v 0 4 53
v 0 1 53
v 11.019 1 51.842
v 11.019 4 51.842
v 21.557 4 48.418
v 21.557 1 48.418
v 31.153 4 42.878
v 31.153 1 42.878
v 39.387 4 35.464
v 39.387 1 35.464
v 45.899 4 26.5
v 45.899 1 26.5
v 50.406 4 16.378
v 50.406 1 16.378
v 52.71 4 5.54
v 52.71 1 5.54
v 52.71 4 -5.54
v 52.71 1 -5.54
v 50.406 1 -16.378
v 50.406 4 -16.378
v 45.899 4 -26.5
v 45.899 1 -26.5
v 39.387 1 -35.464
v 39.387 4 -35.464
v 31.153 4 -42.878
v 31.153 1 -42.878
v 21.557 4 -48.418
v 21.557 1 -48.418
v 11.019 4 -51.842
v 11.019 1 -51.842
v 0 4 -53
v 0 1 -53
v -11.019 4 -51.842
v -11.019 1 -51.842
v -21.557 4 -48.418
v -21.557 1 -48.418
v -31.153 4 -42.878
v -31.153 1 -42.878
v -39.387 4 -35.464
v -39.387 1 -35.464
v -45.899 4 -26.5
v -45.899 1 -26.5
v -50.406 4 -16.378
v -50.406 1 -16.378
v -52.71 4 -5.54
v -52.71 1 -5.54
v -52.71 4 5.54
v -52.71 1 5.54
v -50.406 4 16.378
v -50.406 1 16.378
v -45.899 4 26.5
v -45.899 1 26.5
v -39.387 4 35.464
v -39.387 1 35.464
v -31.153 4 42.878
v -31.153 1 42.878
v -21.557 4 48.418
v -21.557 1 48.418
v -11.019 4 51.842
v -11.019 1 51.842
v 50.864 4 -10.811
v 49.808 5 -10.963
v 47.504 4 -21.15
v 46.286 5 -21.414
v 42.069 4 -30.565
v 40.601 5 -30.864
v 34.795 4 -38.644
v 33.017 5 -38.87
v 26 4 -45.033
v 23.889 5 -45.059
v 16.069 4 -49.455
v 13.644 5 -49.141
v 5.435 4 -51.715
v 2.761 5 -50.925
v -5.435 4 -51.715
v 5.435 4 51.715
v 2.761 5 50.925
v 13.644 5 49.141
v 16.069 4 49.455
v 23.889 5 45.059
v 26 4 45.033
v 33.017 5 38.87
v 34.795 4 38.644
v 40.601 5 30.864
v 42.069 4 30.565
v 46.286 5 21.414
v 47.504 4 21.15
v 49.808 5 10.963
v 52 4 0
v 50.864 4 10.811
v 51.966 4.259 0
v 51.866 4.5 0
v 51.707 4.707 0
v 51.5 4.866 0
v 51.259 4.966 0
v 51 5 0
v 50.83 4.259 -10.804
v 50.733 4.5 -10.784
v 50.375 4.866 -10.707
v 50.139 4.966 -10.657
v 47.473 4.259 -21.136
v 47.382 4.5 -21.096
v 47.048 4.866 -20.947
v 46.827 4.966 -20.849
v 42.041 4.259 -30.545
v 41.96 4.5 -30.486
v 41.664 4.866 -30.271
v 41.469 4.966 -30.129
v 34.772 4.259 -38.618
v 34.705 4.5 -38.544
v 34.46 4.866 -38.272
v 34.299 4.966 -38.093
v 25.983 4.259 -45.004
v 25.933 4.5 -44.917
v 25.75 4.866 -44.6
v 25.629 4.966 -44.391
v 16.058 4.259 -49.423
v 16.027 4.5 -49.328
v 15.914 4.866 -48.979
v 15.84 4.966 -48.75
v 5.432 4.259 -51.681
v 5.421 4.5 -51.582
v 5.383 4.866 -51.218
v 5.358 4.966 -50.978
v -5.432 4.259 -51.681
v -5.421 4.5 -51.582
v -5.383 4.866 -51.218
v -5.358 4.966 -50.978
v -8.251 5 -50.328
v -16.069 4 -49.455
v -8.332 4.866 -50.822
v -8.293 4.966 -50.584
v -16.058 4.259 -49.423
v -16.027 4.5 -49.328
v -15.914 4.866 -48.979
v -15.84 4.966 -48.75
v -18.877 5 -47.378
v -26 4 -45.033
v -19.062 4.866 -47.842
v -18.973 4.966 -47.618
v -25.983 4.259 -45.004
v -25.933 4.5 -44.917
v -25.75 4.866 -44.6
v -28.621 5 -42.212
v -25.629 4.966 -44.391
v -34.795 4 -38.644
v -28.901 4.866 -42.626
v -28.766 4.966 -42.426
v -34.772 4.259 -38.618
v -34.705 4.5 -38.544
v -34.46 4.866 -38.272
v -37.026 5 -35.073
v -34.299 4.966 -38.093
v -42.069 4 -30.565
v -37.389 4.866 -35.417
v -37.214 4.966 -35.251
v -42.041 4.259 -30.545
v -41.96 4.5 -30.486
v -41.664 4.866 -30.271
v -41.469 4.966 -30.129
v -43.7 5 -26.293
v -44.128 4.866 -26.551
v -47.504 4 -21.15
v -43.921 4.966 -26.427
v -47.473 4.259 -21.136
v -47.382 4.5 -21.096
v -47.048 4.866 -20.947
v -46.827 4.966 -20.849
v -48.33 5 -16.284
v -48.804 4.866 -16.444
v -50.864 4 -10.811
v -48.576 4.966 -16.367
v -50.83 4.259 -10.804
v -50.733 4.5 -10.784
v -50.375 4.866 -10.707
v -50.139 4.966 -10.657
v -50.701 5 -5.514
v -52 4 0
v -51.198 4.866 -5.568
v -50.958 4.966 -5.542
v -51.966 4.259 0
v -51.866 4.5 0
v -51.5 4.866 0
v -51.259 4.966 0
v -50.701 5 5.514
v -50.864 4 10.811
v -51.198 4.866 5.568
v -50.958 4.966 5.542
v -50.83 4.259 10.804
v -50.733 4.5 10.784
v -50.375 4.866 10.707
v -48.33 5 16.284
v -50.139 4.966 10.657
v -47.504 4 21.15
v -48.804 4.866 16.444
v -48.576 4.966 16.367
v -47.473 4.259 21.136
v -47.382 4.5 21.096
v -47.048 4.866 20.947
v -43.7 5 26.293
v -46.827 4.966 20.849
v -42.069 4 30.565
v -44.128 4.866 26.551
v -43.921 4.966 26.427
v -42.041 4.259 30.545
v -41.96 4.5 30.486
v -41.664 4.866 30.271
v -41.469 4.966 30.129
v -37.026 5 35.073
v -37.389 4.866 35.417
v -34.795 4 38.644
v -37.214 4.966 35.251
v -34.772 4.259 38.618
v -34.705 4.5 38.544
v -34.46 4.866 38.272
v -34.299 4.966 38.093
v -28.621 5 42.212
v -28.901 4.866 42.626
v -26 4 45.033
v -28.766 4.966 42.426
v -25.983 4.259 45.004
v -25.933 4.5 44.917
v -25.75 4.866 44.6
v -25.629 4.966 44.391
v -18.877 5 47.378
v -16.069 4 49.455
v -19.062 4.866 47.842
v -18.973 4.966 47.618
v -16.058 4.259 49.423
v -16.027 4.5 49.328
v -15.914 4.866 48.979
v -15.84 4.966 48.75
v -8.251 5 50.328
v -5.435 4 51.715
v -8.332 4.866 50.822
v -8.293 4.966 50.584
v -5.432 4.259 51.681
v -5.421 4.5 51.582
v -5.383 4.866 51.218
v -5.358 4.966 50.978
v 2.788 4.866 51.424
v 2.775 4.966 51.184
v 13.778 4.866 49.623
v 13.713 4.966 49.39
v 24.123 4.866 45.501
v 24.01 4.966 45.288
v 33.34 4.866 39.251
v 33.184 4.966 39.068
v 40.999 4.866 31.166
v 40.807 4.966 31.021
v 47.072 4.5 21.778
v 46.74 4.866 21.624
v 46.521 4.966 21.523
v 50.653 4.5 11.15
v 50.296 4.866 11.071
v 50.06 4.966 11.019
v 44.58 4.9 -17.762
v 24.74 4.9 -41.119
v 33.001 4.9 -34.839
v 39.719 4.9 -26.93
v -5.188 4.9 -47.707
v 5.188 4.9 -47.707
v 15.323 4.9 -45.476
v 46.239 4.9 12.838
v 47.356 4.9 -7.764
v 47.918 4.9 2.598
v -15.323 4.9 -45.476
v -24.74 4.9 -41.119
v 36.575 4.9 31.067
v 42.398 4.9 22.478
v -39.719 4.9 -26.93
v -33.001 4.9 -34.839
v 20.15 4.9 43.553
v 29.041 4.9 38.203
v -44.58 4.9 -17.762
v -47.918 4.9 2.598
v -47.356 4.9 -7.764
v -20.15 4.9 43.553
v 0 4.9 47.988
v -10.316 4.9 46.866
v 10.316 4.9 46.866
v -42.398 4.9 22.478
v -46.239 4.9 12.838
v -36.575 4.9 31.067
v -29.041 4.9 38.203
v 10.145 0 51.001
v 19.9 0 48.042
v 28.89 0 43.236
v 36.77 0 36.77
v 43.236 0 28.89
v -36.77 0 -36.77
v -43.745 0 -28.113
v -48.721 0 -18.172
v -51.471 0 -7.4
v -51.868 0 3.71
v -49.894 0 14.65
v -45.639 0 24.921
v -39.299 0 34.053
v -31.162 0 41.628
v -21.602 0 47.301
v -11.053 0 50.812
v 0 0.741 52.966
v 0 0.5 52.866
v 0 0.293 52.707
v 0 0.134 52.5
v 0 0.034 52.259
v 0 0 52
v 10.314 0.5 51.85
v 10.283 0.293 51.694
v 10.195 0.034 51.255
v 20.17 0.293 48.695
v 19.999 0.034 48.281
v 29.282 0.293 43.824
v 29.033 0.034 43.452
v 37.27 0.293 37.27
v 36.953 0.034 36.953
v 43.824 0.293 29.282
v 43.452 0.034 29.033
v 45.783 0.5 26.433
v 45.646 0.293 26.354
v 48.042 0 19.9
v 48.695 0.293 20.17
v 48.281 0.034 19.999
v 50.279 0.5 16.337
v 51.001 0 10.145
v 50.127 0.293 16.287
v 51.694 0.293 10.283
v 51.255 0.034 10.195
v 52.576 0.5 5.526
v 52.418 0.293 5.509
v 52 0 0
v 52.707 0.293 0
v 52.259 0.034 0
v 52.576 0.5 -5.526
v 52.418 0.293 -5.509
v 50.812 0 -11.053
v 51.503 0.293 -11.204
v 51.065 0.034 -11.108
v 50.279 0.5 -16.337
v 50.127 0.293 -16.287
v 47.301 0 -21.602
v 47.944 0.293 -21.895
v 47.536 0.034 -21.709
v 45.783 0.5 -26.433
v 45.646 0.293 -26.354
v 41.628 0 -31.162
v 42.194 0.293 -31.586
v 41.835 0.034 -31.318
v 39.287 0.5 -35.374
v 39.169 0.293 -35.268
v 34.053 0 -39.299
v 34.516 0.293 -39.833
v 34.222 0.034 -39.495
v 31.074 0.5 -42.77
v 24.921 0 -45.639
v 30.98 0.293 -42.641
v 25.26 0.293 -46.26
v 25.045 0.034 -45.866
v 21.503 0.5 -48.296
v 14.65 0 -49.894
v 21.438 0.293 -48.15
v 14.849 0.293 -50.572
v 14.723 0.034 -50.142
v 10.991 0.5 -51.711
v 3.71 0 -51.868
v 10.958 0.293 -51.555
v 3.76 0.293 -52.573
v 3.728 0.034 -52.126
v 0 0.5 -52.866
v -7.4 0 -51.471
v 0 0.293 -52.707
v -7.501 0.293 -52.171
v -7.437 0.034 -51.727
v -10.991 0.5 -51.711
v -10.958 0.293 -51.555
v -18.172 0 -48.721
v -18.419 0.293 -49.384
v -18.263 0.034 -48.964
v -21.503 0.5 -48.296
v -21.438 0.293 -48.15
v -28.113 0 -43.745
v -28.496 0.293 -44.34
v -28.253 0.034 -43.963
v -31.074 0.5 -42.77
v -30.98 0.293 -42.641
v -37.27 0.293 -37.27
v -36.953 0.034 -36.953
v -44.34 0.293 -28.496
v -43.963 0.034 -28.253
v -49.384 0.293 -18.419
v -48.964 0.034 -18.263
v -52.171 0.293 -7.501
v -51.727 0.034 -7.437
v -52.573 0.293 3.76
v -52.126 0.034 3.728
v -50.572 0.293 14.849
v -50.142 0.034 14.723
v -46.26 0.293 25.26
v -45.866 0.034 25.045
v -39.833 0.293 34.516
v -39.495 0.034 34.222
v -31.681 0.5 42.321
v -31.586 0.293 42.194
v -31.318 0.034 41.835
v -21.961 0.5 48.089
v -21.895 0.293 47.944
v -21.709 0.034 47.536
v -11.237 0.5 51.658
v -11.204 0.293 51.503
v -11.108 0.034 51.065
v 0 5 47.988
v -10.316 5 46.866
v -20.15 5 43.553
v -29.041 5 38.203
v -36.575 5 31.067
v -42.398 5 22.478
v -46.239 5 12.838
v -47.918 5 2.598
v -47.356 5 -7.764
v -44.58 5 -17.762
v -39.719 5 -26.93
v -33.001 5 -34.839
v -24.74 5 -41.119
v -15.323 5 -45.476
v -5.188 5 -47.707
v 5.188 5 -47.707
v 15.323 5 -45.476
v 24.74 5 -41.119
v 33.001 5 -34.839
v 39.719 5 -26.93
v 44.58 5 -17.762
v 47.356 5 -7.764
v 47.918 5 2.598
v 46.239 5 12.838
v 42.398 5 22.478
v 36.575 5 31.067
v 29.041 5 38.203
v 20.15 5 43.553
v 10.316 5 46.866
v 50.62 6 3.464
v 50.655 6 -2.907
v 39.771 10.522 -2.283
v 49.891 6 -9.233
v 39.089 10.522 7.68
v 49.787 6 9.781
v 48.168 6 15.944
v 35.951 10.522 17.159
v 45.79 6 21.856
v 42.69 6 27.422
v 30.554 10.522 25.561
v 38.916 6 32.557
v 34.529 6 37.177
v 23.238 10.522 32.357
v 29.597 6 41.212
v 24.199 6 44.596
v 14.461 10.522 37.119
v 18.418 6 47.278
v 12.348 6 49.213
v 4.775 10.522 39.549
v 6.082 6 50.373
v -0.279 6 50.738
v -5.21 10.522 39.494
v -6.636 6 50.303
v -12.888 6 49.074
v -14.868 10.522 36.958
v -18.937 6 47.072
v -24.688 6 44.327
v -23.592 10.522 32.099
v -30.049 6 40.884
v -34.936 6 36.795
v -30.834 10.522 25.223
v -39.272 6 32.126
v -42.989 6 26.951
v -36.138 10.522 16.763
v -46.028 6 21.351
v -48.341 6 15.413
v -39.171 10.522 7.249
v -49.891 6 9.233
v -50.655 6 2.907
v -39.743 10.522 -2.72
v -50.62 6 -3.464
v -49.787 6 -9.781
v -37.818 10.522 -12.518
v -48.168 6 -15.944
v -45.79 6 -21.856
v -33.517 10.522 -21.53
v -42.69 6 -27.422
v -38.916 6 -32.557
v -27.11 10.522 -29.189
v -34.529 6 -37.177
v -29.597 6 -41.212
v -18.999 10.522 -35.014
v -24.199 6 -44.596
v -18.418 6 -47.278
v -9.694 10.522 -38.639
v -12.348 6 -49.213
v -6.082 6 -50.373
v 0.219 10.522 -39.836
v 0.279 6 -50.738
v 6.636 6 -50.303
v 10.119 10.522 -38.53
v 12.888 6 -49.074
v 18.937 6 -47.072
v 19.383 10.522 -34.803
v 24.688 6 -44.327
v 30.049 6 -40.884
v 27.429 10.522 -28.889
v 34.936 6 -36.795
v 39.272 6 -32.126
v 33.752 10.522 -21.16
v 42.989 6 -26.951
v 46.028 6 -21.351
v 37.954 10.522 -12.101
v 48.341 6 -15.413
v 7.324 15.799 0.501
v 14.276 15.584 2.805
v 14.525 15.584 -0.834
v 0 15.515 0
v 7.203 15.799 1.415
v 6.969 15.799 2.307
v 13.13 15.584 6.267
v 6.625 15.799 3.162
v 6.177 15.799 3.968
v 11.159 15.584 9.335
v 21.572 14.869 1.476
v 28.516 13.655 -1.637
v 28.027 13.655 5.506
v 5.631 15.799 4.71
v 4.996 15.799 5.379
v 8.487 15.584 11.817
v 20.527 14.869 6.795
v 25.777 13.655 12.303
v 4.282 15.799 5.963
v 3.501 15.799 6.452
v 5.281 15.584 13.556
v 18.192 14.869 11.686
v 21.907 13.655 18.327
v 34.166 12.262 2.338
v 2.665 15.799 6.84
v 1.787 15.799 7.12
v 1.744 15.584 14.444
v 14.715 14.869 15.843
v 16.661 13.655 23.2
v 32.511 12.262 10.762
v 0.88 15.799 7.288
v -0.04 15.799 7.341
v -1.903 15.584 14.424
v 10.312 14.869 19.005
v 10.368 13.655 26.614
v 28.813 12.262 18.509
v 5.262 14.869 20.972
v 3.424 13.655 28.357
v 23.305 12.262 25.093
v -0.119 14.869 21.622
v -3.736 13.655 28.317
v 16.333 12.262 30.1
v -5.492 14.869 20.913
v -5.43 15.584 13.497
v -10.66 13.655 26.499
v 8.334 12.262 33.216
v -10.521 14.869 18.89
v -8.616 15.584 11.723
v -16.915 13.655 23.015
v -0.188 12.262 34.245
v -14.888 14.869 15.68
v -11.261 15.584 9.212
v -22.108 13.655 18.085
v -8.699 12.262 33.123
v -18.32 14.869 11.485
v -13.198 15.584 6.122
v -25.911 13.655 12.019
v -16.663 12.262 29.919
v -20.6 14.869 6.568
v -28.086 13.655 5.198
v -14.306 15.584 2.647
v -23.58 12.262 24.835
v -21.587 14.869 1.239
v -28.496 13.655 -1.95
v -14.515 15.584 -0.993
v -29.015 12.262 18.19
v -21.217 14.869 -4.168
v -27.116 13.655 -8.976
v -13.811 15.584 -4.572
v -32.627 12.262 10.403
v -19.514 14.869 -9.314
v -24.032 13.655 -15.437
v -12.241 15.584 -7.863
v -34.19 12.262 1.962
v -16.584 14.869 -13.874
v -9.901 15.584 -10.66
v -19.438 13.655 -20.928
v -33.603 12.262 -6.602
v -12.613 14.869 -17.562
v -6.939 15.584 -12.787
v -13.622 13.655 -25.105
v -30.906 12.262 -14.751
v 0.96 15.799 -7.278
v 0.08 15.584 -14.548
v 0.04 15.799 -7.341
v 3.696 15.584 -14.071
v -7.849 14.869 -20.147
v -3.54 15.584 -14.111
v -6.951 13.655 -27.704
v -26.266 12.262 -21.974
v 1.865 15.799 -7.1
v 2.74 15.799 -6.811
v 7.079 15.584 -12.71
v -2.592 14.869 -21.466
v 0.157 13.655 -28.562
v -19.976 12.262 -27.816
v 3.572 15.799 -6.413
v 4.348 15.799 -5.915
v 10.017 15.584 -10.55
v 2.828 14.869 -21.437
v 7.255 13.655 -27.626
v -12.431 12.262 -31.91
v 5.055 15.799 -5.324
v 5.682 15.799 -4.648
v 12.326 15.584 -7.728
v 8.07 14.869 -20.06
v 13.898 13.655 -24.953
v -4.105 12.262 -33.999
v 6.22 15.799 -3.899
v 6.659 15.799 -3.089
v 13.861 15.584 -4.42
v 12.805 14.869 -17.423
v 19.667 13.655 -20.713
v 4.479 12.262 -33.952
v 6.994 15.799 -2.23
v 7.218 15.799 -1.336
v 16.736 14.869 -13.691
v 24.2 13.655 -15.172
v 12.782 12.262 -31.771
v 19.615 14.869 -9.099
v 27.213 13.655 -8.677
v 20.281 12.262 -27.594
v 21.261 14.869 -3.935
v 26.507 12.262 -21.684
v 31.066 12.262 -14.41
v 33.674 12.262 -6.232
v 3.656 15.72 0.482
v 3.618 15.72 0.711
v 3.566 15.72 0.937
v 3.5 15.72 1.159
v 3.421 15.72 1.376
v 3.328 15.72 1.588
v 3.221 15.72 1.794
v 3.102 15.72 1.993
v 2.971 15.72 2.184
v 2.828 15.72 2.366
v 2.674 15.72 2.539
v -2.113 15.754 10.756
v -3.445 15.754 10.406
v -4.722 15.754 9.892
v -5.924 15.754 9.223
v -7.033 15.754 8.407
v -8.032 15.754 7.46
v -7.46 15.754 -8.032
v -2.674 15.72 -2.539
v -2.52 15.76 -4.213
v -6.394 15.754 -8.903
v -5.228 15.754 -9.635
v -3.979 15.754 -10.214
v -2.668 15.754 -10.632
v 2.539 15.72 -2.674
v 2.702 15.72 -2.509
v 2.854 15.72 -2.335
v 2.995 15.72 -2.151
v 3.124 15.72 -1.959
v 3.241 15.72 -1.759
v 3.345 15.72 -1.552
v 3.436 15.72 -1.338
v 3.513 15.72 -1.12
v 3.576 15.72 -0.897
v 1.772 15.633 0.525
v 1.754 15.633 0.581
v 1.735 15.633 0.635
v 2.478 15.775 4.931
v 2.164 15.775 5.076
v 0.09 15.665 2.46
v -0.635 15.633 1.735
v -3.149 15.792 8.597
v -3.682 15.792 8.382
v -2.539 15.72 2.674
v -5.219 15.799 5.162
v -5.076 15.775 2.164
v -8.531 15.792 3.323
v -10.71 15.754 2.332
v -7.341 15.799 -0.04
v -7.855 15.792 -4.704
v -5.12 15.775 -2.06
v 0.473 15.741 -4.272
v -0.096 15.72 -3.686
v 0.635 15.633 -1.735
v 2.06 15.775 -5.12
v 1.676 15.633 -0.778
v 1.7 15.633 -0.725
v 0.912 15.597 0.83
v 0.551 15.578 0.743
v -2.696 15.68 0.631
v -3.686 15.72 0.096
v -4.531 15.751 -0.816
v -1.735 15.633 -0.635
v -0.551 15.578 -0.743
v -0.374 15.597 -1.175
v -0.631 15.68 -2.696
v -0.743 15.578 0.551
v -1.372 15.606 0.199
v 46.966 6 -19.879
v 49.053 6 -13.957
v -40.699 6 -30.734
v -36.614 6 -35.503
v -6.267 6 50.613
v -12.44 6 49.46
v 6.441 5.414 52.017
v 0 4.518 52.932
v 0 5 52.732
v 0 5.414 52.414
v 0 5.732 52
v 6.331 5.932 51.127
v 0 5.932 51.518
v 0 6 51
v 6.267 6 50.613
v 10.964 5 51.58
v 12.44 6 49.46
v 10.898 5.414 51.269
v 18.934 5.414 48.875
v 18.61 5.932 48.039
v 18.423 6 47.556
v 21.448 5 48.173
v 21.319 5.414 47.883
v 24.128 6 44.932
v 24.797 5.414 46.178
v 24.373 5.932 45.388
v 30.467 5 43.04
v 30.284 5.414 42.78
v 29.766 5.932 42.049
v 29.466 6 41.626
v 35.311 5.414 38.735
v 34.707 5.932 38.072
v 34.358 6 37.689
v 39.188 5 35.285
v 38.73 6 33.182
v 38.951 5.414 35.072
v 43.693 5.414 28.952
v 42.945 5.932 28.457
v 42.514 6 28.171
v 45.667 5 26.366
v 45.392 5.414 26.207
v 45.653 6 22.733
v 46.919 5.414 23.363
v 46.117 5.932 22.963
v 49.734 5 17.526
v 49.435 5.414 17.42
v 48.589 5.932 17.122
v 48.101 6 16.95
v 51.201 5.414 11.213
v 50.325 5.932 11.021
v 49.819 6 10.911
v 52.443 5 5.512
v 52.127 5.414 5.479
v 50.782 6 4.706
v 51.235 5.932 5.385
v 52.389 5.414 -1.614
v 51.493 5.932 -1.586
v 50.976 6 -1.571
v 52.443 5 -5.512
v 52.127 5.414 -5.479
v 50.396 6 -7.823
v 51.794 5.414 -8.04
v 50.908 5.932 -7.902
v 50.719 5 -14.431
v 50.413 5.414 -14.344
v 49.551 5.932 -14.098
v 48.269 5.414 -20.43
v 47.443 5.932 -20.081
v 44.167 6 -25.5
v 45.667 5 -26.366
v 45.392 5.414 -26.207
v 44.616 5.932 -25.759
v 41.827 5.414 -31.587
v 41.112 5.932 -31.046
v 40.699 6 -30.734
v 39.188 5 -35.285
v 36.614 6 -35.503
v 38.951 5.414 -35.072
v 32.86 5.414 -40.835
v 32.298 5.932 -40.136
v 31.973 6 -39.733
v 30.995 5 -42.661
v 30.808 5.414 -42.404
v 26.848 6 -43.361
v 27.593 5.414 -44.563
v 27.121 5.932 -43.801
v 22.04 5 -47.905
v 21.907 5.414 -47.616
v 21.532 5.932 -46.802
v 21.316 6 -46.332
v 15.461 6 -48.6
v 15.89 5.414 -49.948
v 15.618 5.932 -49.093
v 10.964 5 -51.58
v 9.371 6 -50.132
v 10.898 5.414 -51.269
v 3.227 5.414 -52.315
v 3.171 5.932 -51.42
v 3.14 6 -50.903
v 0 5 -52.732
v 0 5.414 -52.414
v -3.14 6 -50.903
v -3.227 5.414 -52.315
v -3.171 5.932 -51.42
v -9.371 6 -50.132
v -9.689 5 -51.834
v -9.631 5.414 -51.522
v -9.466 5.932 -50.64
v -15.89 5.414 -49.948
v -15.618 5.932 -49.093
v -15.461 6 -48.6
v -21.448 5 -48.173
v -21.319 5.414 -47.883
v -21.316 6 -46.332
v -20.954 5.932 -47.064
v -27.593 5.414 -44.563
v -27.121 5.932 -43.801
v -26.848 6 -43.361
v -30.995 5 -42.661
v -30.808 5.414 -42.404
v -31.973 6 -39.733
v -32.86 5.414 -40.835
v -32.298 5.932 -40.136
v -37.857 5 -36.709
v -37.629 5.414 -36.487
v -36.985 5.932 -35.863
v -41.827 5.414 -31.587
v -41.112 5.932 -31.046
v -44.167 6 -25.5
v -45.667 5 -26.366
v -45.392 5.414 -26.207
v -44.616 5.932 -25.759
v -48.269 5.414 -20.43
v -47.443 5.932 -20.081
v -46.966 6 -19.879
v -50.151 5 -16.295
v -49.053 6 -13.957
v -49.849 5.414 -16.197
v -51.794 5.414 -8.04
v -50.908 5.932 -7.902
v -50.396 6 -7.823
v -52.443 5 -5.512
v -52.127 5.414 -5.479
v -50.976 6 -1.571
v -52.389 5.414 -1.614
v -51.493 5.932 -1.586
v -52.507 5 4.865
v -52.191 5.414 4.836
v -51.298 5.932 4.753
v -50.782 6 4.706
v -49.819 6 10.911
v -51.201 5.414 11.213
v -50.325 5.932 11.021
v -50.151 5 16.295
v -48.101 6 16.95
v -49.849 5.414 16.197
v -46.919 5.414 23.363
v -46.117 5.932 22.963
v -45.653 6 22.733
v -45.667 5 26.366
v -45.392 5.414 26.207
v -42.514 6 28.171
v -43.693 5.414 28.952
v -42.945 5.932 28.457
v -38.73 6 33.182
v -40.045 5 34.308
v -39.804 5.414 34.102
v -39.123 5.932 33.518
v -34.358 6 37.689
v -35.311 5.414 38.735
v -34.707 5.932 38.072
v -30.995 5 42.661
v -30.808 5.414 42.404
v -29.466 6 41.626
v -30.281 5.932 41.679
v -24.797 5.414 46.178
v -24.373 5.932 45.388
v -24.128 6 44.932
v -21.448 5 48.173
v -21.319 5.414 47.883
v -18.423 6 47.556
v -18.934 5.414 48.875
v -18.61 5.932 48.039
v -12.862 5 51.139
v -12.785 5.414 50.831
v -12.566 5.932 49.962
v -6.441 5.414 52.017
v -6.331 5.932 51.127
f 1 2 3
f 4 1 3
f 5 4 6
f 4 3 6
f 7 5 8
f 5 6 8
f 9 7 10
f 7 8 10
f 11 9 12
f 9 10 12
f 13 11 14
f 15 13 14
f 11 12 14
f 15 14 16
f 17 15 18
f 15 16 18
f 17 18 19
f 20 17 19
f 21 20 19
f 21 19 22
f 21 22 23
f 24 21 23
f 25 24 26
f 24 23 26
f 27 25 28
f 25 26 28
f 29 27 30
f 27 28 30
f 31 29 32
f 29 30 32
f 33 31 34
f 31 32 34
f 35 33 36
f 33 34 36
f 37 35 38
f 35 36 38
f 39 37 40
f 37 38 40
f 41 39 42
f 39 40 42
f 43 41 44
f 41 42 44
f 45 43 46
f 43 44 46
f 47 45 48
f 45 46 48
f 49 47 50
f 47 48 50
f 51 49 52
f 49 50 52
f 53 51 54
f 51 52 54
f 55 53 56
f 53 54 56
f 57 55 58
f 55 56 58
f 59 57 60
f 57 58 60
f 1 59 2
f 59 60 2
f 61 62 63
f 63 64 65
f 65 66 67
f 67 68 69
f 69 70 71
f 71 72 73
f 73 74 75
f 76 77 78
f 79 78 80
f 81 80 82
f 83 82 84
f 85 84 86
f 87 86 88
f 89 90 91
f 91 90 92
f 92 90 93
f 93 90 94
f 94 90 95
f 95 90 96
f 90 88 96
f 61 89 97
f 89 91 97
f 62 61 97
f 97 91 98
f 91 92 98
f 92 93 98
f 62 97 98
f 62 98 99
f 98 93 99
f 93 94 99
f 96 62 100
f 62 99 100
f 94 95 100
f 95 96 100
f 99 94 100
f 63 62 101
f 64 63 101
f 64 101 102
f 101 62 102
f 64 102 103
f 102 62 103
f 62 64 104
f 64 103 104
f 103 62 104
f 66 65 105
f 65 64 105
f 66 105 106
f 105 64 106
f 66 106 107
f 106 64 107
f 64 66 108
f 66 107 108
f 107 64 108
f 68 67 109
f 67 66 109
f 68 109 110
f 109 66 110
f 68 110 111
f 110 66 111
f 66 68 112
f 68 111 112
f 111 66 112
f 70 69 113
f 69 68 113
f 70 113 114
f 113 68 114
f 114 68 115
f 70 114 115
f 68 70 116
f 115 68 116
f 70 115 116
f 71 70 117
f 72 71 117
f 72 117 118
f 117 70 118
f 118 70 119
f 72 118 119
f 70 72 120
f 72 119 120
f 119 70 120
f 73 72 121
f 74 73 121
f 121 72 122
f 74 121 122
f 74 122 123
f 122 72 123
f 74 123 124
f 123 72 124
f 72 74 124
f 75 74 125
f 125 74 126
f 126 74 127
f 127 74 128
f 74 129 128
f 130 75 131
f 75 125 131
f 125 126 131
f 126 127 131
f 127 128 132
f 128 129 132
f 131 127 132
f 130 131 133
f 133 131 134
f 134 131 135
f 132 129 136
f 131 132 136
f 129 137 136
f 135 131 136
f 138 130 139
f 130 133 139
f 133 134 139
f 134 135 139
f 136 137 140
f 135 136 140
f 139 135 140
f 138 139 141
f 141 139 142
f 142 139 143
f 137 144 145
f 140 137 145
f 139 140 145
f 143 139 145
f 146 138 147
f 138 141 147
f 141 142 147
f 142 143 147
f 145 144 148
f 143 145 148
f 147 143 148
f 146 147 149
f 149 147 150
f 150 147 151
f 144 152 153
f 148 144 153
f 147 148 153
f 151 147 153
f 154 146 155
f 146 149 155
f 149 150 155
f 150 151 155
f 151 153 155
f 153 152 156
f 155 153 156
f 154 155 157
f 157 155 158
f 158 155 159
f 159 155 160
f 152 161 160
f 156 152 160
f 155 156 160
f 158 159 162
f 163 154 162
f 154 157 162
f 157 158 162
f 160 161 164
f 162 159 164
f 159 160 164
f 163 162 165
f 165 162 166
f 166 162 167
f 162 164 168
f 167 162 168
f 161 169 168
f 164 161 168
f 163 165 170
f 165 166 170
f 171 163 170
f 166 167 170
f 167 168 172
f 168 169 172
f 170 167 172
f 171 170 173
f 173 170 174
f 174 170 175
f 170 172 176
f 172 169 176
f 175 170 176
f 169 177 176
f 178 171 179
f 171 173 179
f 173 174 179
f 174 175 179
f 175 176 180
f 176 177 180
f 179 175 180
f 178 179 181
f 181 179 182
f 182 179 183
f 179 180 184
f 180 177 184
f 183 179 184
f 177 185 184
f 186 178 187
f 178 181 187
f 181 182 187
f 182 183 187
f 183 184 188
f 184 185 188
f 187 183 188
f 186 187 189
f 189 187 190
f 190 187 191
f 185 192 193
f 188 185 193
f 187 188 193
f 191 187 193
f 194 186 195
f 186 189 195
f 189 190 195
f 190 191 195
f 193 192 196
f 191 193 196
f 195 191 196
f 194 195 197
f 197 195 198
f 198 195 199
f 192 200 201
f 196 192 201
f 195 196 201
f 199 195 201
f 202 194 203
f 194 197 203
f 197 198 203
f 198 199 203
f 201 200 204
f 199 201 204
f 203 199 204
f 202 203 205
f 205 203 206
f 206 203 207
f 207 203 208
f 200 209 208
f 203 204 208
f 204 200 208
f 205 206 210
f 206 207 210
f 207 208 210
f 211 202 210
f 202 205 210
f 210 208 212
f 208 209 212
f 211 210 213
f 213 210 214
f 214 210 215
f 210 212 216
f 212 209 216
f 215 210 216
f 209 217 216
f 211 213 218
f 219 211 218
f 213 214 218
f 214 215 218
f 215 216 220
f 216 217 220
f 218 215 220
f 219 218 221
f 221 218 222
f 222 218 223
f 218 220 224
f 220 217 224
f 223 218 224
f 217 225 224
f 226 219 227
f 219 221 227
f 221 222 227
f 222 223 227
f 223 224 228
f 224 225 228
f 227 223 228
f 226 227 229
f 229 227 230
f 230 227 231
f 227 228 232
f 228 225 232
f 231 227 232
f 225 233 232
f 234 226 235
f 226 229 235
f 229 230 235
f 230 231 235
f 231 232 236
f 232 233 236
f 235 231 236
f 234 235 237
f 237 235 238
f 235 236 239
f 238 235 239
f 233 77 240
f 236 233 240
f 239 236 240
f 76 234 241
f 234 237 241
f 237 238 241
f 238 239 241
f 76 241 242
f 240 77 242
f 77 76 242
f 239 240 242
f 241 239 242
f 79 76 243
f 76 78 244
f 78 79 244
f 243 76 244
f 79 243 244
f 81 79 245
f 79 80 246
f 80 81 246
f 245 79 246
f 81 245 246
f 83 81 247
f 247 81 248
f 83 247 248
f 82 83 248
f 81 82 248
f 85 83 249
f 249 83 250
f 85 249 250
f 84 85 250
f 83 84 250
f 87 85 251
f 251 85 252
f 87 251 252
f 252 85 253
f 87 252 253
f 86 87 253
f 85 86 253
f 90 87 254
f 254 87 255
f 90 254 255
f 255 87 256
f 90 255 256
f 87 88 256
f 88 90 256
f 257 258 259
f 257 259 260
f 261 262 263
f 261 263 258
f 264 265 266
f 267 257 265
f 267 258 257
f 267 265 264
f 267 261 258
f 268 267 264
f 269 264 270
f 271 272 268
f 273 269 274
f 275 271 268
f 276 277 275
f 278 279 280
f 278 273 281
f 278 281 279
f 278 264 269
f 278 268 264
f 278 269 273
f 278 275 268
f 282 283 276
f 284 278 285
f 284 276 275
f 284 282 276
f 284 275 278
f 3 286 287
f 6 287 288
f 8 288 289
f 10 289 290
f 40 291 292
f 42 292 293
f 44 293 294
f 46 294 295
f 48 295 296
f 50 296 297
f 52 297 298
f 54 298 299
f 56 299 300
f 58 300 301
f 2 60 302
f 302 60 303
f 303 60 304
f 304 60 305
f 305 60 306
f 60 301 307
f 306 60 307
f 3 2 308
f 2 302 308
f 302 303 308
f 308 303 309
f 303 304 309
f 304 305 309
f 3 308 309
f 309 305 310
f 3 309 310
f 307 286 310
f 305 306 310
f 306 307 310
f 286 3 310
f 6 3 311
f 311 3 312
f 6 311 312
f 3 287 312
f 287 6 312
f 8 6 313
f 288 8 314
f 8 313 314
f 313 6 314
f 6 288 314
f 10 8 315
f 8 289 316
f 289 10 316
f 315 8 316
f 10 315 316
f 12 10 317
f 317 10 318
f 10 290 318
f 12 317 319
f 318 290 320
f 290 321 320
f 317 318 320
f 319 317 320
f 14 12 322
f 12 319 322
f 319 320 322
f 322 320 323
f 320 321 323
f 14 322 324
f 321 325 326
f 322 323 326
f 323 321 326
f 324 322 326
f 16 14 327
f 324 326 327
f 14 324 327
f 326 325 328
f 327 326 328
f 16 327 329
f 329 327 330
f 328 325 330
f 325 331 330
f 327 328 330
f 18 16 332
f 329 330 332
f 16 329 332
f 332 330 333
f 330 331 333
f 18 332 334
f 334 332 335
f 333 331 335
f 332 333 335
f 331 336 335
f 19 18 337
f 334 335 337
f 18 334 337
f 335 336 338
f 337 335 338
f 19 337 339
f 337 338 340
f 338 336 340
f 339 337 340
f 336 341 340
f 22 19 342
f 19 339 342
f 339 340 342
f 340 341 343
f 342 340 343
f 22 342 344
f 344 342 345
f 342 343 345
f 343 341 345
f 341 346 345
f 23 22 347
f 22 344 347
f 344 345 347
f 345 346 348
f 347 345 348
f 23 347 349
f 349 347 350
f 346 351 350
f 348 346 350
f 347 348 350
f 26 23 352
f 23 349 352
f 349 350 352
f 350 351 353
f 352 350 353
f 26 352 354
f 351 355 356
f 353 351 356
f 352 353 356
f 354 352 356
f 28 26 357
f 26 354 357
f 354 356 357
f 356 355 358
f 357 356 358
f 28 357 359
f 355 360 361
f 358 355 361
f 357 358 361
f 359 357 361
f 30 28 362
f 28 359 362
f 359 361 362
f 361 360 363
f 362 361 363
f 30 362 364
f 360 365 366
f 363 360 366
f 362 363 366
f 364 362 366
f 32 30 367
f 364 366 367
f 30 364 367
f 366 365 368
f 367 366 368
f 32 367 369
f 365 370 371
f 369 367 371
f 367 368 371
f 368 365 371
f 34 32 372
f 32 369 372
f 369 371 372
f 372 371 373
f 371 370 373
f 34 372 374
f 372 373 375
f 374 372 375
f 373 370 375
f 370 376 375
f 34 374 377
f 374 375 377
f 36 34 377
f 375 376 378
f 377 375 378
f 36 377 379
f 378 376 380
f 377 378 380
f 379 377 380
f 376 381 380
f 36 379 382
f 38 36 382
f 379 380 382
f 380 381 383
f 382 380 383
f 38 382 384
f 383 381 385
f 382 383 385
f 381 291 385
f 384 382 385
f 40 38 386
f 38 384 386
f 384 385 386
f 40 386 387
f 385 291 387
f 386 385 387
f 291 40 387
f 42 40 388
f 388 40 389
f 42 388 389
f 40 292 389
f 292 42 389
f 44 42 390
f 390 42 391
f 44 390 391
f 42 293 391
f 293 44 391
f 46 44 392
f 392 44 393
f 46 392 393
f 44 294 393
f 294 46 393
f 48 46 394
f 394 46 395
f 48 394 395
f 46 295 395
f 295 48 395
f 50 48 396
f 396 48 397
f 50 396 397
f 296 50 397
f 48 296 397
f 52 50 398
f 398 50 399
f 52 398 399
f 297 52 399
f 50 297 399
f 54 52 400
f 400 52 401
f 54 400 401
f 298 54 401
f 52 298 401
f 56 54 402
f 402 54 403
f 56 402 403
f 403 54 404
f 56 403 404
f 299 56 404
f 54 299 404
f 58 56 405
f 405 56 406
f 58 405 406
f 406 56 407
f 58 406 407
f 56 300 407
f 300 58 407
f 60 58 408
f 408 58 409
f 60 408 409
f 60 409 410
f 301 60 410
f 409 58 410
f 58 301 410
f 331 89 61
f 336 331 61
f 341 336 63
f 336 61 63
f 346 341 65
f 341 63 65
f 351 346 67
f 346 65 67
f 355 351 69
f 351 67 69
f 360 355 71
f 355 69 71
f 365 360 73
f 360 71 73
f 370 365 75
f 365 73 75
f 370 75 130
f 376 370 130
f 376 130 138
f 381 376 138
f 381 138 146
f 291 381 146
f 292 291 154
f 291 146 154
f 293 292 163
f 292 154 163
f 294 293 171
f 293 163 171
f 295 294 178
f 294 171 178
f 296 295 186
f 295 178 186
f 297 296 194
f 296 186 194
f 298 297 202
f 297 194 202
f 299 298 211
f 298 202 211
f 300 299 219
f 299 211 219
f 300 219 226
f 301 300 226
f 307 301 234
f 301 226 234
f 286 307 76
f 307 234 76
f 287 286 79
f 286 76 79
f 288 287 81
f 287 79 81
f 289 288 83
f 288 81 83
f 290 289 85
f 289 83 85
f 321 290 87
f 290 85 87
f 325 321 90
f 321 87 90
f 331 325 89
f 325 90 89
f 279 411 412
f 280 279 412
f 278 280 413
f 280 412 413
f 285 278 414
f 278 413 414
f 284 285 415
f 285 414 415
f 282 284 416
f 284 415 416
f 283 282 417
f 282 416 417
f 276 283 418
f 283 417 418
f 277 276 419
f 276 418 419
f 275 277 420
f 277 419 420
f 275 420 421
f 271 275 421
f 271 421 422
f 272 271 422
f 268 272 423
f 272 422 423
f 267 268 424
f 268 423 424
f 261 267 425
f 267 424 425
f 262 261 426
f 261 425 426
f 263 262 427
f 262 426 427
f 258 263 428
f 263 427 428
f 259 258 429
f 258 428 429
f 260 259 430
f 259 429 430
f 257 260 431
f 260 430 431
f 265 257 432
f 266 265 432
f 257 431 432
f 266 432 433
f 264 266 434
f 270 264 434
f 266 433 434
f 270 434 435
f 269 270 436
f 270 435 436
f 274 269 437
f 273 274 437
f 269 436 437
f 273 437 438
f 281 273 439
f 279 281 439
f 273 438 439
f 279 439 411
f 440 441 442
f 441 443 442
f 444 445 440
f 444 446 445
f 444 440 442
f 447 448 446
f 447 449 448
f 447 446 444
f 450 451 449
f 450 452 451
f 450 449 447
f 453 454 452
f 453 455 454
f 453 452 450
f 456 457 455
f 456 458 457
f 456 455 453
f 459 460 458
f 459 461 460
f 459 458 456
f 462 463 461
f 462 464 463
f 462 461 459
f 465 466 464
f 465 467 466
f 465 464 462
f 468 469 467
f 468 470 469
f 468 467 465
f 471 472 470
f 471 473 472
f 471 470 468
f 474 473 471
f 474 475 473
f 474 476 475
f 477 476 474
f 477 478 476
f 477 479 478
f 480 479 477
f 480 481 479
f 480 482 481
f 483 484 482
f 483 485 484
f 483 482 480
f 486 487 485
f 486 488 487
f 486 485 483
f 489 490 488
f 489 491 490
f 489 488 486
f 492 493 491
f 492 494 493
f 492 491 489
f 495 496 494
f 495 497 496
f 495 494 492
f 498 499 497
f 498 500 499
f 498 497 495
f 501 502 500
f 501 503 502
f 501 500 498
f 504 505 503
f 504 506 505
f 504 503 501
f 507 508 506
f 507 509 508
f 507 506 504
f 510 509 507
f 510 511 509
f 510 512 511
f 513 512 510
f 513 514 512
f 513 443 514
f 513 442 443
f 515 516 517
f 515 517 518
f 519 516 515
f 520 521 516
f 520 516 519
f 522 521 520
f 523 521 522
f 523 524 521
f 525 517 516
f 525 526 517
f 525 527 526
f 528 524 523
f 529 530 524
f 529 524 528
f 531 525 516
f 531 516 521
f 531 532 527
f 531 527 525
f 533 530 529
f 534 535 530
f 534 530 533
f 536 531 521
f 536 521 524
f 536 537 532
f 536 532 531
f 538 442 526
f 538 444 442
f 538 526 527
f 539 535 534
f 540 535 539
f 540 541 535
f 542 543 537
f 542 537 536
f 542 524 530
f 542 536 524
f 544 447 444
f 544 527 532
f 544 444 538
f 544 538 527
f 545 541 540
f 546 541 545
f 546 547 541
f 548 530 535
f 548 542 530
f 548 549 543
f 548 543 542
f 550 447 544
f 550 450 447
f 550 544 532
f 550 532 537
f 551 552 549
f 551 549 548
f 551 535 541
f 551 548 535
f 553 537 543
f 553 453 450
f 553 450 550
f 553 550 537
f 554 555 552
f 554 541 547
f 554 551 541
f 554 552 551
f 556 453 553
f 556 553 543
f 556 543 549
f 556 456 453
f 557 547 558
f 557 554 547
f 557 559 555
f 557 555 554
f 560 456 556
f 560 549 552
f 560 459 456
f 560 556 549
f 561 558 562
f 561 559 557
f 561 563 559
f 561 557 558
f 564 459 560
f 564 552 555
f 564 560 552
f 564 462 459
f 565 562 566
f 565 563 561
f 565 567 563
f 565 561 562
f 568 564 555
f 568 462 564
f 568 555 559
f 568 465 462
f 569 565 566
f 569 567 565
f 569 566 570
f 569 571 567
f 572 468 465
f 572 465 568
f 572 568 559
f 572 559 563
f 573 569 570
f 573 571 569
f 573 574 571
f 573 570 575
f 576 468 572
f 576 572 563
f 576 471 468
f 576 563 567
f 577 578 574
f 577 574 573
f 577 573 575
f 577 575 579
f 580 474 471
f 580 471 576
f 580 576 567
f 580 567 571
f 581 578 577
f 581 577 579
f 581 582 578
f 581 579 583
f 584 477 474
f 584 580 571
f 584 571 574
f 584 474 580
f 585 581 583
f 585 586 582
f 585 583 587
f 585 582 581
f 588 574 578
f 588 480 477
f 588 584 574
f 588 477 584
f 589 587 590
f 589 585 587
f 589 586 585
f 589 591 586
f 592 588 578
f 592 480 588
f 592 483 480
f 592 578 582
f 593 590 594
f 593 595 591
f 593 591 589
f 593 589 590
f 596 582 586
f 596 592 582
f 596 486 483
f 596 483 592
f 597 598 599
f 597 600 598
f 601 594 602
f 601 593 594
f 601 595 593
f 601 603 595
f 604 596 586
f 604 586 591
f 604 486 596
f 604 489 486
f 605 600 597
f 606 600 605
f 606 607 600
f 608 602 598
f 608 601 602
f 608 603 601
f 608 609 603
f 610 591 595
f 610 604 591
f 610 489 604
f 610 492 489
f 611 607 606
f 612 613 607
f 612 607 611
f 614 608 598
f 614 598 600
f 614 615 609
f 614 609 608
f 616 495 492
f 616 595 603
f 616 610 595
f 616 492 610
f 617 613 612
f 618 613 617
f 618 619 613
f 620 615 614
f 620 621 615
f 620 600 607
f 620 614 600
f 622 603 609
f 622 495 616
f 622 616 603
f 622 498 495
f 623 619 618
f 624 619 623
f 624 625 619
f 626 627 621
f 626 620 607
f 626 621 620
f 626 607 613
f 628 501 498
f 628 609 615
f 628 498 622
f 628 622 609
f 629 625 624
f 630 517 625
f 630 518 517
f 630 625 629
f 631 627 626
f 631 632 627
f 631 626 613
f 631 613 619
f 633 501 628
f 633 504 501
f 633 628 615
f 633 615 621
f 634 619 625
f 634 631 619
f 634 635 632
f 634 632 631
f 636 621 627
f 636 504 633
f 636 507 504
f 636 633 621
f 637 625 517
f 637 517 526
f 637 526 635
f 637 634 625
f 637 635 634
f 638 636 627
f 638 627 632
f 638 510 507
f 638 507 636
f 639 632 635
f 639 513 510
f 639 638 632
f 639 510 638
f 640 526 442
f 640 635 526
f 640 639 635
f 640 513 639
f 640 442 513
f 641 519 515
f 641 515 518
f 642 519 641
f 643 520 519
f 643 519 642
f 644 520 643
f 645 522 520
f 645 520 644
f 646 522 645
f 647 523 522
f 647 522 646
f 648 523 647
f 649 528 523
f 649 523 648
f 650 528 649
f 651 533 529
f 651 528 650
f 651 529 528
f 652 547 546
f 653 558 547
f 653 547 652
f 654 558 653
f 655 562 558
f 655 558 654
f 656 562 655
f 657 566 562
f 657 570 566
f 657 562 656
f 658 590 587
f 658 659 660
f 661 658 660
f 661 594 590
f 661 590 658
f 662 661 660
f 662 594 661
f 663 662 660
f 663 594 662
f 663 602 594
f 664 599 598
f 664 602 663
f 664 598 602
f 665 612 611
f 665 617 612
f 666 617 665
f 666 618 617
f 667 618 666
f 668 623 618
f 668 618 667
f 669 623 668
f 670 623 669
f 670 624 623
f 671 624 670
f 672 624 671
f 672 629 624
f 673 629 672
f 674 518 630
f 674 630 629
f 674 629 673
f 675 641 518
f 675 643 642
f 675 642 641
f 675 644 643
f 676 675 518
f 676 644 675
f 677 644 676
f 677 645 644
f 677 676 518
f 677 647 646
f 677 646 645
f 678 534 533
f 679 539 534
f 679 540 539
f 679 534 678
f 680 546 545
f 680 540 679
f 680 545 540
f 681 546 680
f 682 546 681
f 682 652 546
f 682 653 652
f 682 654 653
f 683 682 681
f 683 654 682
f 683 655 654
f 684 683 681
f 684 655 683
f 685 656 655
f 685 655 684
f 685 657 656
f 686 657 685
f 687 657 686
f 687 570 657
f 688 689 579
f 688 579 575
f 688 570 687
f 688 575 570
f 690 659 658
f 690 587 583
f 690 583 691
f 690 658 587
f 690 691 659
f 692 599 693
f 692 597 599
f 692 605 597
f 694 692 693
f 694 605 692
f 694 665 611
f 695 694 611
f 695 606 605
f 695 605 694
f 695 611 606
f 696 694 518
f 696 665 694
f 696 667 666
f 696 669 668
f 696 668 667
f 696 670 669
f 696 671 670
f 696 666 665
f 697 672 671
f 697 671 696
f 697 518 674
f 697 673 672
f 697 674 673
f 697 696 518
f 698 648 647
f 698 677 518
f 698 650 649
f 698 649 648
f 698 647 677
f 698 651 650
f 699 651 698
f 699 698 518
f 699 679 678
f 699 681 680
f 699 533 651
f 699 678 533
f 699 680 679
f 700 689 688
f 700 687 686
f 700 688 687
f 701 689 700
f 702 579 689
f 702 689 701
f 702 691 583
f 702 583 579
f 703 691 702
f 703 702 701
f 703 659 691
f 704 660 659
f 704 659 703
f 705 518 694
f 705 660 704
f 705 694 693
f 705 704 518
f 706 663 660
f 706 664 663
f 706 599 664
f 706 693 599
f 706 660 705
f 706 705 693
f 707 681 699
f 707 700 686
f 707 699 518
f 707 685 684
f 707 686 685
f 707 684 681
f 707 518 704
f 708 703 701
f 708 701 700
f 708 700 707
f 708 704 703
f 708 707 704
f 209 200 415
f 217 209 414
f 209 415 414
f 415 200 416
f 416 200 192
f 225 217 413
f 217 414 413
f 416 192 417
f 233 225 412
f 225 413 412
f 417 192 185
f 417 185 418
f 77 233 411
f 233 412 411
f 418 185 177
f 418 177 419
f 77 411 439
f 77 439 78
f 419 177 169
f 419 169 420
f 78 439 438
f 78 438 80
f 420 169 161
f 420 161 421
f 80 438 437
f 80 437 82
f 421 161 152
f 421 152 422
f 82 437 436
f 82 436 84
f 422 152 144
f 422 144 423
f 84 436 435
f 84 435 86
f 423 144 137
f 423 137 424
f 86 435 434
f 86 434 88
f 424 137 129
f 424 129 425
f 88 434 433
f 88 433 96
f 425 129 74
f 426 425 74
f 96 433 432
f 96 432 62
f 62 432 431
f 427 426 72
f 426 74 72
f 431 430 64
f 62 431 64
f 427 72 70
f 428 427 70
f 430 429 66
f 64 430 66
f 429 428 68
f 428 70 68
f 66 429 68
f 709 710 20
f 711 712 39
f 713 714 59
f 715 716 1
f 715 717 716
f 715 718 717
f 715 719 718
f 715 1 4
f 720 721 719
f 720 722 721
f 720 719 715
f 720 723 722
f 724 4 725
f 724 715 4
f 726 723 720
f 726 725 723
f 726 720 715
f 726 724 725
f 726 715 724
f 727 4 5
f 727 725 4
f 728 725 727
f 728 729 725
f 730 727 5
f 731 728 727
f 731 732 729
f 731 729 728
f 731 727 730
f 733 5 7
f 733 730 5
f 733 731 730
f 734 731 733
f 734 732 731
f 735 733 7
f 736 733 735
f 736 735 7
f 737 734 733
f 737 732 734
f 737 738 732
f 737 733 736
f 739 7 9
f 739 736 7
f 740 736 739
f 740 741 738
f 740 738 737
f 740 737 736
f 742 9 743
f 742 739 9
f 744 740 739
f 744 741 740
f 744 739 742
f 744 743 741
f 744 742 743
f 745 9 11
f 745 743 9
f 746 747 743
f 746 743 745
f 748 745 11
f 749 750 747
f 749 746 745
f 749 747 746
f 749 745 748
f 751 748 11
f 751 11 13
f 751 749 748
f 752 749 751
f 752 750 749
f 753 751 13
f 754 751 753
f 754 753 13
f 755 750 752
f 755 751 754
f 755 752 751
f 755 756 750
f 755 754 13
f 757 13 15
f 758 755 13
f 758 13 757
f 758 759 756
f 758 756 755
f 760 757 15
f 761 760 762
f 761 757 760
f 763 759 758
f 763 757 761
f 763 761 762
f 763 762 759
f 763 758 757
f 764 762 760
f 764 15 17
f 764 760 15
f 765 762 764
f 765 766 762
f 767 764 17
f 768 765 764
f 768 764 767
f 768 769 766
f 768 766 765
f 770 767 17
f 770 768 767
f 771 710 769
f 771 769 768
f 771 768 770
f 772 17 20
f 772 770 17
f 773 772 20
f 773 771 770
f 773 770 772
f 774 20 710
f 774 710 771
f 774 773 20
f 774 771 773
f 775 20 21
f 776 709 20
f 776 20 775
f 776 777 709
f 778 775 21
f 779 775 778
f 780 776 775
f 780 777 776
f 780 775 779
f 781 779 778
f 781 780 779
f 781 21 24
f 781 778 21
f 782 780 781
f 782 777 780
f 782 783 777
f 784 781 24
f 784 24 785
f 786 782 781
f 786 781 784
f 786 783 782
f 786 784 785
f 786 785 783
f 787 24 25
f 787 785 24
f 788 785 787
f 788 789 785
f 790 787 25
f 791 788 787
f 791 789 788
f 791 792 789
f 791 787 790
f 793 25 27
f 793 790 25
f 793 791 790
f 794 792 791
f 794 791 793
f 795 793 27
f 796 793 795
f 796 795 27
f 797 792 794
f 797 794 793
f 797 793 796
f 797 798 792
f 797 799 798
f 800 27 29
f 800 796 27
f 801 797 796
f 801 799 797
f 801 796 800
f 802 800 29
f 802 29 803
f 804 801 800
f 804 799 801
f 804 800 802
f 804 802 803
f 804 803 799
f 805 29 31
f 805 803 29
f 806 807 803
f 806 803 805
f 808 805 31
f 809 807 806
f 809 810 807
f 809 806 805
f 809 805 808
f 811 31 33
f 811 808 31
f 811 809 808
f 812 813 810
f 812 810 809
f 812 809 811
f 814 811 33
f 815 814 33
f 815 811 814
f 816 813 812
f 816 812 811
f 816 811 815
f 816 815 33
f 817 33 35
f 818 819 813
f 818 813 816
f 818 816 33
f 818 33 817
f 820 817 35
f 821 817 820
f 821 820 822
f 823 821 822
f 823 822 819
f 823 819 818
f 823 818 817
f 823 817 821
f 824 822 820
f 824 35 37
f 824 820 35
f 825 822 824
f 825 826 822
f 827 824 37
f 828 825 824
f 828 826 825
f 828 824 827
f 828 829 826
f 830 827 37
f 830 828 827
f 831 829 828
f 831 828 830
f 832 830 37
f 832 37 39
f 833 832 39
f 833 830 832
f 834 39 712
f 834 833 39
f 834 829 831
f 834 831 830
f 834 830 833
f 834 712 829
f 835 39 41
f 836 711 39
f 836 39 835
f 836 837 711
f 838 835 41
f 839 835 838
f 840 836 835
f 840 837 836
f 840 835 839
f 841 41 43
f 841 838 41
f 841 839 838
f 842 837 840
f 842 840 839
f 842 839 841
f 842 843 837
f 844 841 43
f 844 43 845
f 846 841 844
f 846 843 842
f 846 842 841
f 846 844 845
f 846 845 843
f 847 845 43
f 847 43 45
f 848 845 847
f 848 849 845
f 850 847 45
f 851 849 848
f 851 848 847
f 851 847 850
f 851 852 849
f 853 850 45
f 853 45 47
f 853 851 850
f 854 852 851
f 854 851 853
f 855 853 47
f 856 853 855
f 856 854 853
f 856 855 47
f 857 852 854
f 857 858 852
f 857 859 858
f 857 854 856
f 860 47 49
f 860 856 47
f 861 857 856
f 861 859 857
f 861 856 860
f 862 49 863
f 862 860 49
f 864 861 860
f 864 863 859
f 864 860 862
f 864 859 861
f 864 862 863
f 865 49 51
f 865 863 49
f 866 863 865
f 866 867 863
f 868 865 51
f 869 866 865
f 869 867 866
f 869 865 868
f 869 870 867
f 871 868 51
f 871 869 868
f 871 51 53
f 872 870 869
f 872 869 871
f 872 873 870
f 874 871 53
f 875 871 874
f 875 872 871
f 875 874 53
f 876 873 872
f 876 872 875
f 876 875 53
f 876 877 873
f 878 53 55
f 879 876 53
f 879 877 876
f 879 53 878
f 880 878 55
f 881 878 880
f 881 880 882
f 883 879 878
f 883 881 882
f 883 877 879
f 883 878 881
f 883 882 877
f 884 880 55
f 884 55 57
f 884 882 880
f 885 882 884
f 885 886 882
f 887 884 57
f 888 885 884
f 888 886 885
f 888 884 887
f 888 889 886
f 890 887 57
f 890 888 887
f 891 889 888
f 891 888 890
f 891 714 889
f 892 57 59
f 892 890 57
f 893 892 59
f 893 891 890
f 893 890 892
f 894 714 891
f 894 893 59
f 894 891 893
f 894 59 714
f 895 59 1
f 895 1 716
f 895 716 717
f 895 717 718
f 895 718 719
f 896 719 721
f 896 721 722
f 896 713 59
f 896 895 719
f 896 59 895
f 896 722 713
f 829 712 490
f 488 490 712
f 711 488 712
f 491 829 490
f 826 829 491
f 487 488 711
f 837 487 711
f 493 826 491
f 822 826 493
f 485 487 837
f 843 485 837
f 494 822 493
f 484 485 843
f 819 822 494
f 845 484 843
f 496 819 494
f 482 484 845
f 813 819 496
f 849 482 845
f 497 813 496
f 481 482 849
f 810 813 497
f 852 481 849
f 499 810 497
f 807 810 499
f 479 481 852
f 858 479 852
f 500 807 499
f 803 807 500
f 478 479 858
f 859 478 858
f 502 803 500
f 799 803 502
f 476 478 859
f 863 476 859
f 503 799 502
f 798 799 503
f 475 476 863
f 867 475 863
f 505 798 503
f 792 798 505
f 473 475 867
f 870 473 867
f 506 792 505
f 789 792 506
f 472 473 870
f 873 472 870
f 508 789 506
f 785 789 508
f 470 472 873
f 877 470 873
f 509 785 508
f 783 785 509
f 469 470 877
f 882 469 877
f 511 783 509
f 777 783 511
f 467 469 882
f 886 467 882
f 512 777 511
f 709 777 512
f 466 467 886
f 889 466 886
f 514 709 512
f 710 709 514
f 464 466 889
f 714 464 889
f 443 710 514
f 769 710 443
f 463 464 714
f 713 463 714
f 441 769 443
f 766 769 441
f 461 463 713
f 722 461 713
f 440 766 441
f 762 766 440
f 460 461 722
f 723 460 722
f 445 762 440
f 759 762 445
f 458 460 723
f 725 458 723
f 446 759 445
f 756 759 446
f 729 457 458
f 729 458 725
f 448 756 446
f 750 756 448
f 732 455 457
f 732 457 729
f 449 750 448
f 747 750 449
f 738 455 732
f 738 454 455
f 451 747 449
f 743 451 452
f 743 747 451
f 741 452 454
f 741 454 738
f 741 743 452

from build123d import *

# Parameters (mm, degrees)
SKETCH_1_R      = 53
EXTRUDE_1_DEPTH = 6
FILLET_3_R      = 2
FILLET_4_R      = 1
SKETCH_6_R      = 47.988125992
EXTRUDE_2_DEPTH = 0.1


# Read off the part's stored shape, not the designer's step: 抽壳2
with BuildPart() as part:
    # 草图1 → 凸台-拉伸1 (new body)
    with BuildSketch(Plane(origin=(0, 0, 0), x_dir=(1, 0, 0), z_dir=(0, 1, 0))):
        with Locations(Location((0, 0, 0), (0, 0, 270))):
            Circle(SKETCH_1_R)
    extrude(amount=EXTRUDE_1_DEPTH)

    # 草图3 → 旋转1 (revolve)
    with BuildSketch(Plane(origin=(0, 0, 0), x_dir=(0.9983570071777269, 0, -0.05729996700812362), z_dir=(0.05729996700812362, 0, 0.9983570071777269))):
        with BuildLine():
            Line((0, 15.515098755), (0, 6))
            Line((0, 6), (50.738604569, 6))
            add(Edge.make_bspline(
                [(0, 15.515098755), (27.166184936, 17.472084947), (50.738604569, 6)],
                knots=[0, 0, 0, 1, 1, 1], degree=2))
        make_face()
    revolve(axis=Axis((0, 15.515098755, 0), (0, -1, 0)))

    # 圆角3
    fillet_3_edges = [part.edges().sort_by_distance(p)[0] for p in [
        (0, 6, -53),
    ]]
    fillet(fillet_3_edges, radius=FILLET_3_R)

    # 圆角4
    fillet_4_edges = [part.edges().sort_by_distance(p)[0] for p in [
        (0, 0, -53),
    ]]
    fillet(fillet_4_edges, radius=FILLET_4_R)

    # 抽壳2 outline → 抽壳2 (revolve, cut)
    with BuildSketch(Plane.XY):
        with BuildLine():
            Line((52, 0), (52, 4))
            ThreePointArc((52, 4), (51.707106781, 4.707106781), (51, 5))
            Line((51, 5), (0, 5))
            Line((0, 5), (0, 0))
            Line((0, 0), (52, 0))
        make_face()
    revolve(axis=Axis((0, 0, 0), (0, 1, 0)), mode=Mode.SUBTRACT)

    # 草图6 → 凸台-拉伸2 (add)
    with BuildSketch(Plane.XZ.offset(-5)):
        with Locations(Location((0, 0, 0), (0, 0, 90))):
            Circle(SKETCH_6_R)
    extrude(amount=EXTRUDE_2_DEPTH)


solid = part.part
